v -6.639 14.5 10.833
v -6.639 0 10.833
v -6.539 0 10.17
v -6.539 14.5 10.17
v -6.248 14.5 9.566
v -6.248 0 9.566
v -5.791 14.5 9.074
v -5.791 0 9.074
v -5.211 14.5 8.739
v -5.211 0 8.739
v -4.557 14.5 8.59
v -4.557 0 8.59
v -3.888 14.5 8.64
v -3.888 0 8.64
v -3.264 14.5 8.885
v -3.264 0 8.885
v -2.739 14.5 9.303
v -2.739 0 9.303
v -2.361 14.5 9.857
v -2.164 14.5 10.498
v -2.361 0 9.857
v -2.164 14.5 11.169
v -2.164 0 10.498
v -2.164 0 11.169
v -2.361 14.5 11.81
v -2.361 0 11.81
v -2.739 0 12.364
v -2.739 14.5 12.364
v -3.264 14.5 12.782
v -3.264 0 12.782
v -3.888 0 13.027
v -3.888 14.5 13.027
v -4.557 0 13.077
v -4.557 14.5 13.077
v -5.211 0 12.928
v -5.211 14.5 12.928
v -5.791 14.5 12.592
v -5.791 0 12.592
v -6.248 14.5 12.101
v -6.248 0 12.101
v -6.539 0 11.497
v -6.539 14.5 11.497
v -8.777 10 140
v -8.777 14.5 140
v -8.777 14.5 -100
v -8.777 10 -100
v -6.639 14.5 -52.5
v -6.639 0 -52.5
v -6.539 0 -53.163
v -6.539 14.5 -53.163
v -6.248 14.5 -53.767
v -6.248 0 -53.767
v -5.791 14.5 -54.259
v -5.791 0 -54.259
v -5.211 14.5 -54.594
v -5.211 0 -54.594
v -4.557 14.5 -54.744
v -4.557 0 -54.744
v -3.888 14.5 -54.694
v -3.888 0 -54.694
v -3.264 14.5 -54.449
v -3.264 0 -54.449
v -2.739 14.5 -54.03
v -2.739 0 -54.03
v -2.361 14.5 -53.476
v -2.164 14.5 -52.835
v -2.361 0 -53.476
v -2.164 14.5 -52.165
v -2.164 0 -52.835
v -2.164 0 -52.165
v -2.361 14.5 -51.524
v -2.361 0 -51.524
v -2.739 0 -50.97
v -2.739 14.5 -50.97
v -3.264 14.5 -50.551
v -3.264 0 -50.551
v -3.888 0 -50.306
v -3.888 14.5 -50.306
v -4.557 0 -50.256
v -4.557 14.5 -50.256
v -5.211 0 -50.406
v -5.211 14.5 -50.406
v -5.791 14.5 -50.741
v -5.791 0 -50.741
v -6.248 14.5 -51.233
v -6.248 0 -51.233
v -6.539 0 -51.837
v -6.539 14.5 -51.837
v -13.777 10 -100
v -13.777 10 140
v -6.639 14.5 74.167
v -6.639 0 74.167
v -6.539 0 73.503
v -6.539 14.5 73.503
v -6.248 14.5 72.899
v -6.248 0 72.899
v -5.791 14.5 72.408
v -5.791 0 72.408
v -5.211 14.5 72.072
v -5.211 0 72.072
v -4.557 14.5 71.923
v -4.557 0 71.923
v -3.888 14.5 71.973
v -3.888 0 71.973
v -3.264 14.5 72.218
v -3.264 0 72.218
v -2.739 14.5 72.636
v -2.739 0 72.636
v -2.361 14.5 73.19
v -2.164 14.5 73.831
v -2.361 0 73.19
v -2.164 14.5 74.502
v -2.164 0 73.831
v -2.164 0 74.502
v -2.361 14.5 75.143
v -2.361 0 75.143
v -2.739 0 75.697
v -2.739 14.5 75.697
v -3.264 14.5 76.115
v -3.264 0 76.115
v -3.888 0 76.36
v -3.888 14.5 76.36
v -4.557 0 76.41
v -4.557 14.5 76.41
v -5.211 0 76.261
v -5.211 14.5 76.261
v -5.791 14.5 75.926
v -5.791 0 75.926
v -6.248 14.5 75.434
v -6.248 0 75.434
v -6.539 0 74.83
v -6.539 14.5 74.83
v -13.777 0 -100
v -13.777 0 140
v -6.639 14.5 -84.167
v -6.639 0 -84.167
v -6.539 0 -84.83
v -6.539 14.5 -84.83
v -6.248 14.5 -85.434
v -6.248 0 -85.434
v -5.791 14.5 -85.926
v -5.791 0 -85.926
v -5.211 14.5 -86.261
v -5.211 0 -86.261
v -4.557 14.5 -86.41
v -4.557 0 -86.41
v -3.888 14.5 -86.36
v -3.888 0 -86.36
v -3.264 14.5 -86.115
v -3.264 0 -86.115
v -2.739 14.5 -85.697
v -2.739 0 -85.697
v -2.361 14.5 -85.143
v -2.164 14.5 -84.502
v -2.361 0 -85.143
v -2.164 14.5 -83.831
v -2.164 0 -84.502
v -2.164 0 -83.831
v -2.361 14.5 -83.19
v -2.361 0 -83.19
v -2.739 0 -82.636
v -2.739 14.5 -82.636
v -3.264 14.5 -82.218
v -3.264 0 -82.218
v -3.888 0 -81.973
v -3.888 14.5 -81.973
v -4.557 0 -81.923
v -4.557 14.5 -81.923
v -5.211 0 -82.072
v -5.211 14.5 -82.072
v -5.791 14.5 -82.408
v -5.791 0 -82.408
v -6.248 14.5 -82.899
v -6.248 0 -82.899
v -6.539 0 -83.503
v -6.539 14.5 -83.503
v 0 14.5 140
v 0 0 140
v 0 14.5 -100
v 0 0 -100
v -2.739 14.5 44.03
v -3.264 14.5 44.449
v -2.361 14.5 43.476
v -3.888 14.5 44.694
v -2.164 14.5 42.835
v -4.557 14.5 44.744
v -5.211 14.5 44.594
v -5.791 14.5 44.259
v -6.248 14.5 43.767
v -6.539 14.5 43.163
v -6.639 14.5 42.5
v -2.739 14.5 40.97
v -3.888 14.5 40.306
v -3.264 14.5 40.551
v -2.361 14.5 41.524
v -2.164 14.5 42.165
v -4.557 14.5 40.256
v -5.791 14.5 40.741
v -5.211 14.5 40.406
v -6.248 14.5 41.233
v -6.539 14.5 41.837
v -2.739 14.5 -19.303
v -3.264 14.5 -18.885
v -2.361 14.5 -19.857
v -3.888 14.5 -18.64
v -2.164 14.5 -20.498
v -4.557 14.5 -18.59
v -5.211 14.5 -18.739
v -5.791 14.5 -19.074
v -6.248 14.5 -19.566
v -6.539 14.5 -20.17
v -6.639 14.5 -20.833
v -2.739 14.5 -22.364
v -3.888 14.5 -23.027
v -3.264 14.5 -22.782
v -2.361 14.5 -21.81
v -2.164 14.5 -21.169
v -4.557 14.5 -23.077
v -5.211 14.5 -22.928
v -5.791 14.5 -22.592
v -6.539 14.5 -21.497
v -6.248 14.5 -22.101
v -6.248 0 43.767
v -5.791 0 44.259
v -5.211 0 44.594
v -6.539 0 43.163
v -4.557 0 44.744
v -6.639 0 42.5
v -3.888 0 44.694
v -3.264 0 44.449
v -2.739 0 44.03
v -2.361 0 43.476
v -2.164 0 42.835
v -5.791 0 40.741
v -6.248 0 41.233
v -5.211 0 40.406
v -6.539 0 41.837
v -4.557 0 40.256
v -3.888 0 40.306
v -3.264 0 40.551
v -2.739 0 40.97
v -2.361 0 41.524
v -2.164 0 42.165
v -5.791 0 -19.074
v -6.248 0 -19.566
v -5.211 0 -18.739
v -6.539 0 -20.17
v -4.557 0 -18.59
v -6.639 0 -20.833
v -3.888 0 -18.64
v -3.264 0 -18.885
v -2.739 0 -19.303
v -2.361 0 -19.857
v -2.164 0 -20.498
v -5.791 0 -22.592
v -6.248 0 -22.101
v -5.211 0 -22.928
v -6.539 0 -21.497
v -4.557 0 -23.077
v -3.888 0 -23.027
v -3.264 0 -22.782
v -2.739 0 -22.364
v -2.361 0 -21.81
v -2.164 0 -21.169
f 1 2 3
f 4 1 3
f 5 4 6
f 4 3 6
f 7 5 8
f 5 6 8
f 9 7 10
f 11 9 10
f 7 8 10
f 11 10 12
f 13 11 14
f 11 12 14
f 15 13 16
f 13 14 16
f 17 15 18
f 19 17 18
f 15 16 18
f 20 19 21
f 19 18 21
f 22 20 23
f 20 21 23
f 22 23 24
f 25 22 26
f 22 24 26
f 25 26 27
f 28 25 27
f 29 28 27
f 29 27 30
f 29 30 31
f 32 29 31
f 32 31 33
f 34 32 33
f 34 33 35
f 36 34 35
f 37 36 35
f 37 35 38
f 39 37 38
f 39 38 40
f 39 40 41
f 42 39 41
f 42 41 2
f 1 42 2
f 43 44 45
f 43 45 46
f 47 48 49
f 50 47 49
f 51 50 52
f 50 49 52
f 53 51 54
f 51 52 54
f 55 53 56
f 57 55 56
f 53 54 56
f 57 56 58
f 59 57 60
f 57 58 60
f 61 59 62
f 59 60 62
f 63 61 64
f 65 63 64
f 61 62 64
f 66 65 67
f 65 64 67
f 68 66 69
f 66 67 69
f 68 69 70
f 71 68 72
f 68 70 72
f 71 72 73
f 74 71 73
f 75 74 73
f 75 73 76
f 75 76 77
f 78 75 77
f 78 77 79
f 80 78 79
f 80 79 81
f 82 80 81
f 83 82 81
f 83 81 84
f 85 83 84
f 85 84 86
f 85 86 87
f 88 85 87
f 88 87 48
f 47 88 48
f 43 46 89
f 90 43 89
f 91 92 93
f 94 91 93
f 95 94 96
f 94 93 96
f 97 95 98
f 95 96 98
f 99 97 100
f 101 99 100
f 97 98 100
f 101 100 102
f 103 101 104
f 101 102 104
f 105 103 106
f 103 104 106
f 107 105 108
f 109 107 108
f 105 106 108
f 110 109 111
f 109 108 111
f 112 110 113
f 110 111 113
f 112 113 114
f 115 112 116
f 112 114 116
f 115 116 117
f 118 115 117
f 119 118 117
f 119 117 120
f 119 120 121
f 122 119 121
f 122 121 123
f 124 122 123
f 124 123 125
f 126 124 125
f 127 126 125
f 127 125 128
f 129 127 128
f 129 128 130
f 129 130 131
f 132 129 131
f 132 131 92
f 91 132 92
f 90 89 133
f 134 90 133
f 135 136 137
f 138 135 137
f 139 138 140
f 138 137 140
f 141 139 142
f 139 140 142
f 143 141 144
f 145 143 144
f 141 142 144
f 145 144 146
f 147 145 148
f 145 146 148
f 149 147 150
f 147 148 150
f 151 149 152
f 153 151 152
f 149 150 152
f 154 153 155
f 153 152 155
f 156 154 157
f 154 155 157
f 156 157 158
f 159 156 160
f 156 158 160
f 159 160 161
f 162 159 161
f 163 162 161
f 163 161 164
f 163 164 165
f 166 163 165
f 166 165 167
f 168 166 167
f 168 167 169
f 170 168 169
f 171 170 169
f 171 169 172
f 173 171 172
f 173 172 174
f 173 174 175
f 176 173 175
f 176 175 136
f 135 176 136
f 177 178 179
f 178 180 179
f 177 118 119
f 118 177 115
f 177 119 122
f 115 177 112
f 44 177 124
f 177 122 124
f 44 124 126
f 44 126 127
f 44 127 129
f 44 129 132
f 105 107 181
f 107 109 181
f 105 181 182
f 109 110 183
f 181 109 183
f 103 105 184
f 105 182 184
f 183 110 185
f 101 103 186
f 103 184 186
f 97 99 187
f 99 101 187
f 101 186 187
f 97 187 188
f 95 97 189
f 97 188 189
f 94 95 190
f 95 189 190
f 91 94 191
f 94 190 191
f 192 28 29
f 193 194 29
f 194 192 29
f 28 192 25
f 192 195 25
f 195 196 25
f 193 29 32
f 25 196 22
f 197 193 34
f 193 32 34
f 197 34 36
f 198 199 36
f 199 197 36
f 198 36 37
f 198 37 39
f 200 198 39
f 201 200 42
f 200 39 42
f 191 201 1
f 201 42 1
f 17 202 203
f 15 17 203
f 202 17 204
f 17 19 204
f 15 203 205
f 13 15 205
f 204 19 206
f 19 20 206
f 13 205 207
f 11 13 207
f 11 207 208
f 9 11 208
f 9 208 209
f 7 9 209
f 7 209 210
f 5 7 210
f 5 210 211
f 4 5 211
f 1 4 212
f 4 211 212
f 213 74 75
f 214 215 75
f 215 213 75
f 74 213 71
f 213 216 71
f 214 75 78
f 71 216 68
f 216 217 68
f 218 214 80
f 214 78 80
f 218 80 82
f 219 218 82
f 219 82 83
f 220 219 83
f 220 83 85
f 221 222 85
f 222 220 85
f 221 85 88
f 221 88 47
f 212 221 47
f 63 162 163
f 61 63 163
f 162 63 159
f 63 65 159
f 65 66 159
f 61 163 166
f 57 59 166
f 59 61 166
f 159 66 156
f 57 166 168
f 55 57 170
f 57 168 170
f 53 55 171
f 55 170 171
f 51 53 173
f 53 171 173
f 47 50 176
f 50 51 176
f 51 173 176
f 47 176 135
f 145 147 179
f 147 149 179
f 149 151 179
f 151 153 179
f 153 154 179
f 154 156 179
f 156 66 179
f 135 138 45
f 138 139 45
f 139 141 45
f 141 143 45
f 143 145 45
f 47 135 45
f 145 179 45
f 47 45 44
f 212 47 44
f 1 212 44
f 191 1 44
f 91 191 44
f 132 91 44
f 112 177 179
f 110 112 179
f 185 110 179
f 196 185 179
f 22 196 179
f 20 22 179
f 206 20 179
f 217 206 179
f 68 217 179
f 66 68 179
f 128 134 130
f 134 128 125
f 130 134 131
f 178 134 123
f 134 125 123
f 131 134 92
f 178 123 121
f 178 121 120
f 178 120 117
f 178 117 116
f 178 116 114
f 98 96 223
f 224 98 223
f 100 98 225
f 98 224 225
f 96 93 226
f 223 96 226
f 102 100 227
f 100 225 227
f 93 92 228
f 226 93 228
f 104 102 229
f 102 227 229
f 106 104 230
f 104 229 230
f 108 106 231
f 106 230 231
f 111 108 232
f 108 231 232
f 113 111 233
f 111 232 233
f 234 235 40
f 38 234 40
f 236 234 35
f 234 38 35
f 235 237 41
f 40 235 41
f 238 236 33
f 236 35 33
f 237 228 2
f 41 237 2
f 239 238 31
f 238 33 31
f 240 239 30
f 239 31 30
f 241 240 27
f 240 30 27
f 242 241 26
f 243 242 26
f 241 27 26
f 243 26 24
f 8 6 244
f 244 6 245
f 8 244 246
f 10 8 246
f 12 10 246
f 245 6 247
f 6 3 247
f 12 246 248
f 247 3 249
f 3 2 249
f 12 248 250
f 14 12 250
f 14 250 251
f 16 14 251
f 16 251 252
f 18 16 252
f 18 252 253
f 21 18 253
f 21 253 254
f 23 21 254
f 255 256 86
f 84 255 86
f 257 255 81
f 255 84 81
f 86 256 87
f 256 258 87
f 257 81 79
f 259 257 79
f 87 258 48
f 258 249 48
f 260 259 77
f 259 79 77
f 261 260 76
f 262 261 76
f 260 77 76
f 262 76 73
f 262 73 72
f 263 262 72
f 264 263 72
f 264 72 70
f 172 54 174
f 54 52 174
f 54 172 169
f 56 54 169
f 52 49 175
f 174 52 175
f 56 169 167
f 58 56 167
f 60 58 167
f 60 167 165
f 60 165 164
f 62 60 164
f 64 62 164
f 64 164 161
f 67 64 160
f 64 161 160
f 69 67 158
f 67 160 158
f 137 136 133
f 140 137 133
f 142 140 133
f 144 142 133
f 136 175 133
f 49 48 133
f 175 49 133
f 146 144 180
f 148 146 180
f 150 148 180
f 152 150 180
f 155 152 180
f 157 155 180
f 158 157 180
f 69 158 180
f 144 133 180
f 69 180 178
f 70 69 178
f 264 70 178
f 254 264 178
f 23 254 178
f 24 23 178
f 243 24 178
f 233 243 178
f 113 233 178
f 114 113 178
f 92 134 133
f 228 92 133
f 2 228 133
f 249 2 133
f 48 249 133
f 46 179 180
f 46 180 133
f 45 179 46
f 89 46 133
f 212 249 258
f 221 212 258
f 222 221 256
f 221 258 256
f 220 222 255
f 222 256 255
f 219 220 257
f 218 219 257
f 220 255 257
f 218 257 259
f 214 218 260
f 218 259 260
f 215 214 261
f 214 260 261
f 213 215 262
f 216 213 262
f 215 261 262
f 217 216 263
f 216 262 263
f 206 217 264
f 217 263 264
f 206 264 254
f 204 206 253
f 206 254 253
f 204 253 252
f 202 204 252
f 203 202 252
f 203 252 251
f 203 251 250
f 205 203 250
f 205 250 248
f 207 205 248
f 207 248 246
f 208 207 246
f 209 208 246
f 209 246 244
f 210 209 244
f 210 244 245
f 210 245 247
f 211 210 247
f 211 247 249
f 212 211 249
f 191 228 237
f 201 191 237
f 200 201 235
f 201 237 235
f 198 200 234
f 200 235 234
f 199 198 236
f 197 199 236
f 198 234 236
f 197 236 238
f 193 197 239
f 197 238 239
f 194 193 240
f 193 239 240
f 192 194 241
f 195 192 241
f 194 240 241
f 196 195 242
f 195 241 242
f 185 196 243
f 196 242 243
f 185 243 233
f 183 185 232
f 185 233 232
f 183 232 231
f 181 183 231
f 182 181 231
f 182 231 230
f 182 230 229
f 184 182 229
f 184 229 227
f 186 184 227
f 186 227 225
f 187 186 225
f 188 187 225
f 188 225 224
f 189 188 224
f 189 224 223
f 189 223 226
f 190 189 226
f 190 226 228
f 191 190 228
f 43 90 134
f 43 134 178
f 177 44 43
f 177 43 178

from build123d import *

# Parameters (mm, degrees)
BOSS_EXTRU_1_DEPTH              = 100
DIAM_TRE_DU_PER_AGE_4_5_4_5_1_D = 4.5
BOSS_EXTRU_2_DEPTH              = 40


with BuildPart() as part:
    # Esquisse1 → Boss.-Extru.1 (new, symmetric)
    with BuildSketch(Plane.XY):
        Polygon((-13.777077185, 10), (-8.777077185, 10), (-8.777077185, 14.5), (0, 14.5), (0, 0), (-13.777077185, 0), align=None)
    extrude(amount=BOSS_EXTRU_1_DEPTH, both=True)

    # Diamètre du perçage Ø4.5 (4.5)1 (through all)
    with Locations(Plane(origin=(0, 14.5, 0), x_dir=(1, 0, 0), z_dir=(0, 1, 0))):
        with Locations((-4.388538592, -74.166666667), (-4.388538592, 84.166666667), (-4.388538592, 52.5), (-4.388538592, 20.833333333), (-4.388538592, -10.833333333), (-4.388538592, -42.5)):
            Hole(DIAM_TRE_DU_PER_AGE_4_5_4_5_1_D / 2)

    # Esquisse4 → Boss.-Extru.2 (add)
    with BuildSketch(Plane.XY.offset(100)):
        Polygon((-13.777077185, 10), (-13.777077185, 0), (0, 0), (0, 14.5), (-8.777077185, 14.5), (-8.777077185, 10), align=None)
    extrude(amount=BOSS_EXTRU_2_DEPTH)


solid = part.part
